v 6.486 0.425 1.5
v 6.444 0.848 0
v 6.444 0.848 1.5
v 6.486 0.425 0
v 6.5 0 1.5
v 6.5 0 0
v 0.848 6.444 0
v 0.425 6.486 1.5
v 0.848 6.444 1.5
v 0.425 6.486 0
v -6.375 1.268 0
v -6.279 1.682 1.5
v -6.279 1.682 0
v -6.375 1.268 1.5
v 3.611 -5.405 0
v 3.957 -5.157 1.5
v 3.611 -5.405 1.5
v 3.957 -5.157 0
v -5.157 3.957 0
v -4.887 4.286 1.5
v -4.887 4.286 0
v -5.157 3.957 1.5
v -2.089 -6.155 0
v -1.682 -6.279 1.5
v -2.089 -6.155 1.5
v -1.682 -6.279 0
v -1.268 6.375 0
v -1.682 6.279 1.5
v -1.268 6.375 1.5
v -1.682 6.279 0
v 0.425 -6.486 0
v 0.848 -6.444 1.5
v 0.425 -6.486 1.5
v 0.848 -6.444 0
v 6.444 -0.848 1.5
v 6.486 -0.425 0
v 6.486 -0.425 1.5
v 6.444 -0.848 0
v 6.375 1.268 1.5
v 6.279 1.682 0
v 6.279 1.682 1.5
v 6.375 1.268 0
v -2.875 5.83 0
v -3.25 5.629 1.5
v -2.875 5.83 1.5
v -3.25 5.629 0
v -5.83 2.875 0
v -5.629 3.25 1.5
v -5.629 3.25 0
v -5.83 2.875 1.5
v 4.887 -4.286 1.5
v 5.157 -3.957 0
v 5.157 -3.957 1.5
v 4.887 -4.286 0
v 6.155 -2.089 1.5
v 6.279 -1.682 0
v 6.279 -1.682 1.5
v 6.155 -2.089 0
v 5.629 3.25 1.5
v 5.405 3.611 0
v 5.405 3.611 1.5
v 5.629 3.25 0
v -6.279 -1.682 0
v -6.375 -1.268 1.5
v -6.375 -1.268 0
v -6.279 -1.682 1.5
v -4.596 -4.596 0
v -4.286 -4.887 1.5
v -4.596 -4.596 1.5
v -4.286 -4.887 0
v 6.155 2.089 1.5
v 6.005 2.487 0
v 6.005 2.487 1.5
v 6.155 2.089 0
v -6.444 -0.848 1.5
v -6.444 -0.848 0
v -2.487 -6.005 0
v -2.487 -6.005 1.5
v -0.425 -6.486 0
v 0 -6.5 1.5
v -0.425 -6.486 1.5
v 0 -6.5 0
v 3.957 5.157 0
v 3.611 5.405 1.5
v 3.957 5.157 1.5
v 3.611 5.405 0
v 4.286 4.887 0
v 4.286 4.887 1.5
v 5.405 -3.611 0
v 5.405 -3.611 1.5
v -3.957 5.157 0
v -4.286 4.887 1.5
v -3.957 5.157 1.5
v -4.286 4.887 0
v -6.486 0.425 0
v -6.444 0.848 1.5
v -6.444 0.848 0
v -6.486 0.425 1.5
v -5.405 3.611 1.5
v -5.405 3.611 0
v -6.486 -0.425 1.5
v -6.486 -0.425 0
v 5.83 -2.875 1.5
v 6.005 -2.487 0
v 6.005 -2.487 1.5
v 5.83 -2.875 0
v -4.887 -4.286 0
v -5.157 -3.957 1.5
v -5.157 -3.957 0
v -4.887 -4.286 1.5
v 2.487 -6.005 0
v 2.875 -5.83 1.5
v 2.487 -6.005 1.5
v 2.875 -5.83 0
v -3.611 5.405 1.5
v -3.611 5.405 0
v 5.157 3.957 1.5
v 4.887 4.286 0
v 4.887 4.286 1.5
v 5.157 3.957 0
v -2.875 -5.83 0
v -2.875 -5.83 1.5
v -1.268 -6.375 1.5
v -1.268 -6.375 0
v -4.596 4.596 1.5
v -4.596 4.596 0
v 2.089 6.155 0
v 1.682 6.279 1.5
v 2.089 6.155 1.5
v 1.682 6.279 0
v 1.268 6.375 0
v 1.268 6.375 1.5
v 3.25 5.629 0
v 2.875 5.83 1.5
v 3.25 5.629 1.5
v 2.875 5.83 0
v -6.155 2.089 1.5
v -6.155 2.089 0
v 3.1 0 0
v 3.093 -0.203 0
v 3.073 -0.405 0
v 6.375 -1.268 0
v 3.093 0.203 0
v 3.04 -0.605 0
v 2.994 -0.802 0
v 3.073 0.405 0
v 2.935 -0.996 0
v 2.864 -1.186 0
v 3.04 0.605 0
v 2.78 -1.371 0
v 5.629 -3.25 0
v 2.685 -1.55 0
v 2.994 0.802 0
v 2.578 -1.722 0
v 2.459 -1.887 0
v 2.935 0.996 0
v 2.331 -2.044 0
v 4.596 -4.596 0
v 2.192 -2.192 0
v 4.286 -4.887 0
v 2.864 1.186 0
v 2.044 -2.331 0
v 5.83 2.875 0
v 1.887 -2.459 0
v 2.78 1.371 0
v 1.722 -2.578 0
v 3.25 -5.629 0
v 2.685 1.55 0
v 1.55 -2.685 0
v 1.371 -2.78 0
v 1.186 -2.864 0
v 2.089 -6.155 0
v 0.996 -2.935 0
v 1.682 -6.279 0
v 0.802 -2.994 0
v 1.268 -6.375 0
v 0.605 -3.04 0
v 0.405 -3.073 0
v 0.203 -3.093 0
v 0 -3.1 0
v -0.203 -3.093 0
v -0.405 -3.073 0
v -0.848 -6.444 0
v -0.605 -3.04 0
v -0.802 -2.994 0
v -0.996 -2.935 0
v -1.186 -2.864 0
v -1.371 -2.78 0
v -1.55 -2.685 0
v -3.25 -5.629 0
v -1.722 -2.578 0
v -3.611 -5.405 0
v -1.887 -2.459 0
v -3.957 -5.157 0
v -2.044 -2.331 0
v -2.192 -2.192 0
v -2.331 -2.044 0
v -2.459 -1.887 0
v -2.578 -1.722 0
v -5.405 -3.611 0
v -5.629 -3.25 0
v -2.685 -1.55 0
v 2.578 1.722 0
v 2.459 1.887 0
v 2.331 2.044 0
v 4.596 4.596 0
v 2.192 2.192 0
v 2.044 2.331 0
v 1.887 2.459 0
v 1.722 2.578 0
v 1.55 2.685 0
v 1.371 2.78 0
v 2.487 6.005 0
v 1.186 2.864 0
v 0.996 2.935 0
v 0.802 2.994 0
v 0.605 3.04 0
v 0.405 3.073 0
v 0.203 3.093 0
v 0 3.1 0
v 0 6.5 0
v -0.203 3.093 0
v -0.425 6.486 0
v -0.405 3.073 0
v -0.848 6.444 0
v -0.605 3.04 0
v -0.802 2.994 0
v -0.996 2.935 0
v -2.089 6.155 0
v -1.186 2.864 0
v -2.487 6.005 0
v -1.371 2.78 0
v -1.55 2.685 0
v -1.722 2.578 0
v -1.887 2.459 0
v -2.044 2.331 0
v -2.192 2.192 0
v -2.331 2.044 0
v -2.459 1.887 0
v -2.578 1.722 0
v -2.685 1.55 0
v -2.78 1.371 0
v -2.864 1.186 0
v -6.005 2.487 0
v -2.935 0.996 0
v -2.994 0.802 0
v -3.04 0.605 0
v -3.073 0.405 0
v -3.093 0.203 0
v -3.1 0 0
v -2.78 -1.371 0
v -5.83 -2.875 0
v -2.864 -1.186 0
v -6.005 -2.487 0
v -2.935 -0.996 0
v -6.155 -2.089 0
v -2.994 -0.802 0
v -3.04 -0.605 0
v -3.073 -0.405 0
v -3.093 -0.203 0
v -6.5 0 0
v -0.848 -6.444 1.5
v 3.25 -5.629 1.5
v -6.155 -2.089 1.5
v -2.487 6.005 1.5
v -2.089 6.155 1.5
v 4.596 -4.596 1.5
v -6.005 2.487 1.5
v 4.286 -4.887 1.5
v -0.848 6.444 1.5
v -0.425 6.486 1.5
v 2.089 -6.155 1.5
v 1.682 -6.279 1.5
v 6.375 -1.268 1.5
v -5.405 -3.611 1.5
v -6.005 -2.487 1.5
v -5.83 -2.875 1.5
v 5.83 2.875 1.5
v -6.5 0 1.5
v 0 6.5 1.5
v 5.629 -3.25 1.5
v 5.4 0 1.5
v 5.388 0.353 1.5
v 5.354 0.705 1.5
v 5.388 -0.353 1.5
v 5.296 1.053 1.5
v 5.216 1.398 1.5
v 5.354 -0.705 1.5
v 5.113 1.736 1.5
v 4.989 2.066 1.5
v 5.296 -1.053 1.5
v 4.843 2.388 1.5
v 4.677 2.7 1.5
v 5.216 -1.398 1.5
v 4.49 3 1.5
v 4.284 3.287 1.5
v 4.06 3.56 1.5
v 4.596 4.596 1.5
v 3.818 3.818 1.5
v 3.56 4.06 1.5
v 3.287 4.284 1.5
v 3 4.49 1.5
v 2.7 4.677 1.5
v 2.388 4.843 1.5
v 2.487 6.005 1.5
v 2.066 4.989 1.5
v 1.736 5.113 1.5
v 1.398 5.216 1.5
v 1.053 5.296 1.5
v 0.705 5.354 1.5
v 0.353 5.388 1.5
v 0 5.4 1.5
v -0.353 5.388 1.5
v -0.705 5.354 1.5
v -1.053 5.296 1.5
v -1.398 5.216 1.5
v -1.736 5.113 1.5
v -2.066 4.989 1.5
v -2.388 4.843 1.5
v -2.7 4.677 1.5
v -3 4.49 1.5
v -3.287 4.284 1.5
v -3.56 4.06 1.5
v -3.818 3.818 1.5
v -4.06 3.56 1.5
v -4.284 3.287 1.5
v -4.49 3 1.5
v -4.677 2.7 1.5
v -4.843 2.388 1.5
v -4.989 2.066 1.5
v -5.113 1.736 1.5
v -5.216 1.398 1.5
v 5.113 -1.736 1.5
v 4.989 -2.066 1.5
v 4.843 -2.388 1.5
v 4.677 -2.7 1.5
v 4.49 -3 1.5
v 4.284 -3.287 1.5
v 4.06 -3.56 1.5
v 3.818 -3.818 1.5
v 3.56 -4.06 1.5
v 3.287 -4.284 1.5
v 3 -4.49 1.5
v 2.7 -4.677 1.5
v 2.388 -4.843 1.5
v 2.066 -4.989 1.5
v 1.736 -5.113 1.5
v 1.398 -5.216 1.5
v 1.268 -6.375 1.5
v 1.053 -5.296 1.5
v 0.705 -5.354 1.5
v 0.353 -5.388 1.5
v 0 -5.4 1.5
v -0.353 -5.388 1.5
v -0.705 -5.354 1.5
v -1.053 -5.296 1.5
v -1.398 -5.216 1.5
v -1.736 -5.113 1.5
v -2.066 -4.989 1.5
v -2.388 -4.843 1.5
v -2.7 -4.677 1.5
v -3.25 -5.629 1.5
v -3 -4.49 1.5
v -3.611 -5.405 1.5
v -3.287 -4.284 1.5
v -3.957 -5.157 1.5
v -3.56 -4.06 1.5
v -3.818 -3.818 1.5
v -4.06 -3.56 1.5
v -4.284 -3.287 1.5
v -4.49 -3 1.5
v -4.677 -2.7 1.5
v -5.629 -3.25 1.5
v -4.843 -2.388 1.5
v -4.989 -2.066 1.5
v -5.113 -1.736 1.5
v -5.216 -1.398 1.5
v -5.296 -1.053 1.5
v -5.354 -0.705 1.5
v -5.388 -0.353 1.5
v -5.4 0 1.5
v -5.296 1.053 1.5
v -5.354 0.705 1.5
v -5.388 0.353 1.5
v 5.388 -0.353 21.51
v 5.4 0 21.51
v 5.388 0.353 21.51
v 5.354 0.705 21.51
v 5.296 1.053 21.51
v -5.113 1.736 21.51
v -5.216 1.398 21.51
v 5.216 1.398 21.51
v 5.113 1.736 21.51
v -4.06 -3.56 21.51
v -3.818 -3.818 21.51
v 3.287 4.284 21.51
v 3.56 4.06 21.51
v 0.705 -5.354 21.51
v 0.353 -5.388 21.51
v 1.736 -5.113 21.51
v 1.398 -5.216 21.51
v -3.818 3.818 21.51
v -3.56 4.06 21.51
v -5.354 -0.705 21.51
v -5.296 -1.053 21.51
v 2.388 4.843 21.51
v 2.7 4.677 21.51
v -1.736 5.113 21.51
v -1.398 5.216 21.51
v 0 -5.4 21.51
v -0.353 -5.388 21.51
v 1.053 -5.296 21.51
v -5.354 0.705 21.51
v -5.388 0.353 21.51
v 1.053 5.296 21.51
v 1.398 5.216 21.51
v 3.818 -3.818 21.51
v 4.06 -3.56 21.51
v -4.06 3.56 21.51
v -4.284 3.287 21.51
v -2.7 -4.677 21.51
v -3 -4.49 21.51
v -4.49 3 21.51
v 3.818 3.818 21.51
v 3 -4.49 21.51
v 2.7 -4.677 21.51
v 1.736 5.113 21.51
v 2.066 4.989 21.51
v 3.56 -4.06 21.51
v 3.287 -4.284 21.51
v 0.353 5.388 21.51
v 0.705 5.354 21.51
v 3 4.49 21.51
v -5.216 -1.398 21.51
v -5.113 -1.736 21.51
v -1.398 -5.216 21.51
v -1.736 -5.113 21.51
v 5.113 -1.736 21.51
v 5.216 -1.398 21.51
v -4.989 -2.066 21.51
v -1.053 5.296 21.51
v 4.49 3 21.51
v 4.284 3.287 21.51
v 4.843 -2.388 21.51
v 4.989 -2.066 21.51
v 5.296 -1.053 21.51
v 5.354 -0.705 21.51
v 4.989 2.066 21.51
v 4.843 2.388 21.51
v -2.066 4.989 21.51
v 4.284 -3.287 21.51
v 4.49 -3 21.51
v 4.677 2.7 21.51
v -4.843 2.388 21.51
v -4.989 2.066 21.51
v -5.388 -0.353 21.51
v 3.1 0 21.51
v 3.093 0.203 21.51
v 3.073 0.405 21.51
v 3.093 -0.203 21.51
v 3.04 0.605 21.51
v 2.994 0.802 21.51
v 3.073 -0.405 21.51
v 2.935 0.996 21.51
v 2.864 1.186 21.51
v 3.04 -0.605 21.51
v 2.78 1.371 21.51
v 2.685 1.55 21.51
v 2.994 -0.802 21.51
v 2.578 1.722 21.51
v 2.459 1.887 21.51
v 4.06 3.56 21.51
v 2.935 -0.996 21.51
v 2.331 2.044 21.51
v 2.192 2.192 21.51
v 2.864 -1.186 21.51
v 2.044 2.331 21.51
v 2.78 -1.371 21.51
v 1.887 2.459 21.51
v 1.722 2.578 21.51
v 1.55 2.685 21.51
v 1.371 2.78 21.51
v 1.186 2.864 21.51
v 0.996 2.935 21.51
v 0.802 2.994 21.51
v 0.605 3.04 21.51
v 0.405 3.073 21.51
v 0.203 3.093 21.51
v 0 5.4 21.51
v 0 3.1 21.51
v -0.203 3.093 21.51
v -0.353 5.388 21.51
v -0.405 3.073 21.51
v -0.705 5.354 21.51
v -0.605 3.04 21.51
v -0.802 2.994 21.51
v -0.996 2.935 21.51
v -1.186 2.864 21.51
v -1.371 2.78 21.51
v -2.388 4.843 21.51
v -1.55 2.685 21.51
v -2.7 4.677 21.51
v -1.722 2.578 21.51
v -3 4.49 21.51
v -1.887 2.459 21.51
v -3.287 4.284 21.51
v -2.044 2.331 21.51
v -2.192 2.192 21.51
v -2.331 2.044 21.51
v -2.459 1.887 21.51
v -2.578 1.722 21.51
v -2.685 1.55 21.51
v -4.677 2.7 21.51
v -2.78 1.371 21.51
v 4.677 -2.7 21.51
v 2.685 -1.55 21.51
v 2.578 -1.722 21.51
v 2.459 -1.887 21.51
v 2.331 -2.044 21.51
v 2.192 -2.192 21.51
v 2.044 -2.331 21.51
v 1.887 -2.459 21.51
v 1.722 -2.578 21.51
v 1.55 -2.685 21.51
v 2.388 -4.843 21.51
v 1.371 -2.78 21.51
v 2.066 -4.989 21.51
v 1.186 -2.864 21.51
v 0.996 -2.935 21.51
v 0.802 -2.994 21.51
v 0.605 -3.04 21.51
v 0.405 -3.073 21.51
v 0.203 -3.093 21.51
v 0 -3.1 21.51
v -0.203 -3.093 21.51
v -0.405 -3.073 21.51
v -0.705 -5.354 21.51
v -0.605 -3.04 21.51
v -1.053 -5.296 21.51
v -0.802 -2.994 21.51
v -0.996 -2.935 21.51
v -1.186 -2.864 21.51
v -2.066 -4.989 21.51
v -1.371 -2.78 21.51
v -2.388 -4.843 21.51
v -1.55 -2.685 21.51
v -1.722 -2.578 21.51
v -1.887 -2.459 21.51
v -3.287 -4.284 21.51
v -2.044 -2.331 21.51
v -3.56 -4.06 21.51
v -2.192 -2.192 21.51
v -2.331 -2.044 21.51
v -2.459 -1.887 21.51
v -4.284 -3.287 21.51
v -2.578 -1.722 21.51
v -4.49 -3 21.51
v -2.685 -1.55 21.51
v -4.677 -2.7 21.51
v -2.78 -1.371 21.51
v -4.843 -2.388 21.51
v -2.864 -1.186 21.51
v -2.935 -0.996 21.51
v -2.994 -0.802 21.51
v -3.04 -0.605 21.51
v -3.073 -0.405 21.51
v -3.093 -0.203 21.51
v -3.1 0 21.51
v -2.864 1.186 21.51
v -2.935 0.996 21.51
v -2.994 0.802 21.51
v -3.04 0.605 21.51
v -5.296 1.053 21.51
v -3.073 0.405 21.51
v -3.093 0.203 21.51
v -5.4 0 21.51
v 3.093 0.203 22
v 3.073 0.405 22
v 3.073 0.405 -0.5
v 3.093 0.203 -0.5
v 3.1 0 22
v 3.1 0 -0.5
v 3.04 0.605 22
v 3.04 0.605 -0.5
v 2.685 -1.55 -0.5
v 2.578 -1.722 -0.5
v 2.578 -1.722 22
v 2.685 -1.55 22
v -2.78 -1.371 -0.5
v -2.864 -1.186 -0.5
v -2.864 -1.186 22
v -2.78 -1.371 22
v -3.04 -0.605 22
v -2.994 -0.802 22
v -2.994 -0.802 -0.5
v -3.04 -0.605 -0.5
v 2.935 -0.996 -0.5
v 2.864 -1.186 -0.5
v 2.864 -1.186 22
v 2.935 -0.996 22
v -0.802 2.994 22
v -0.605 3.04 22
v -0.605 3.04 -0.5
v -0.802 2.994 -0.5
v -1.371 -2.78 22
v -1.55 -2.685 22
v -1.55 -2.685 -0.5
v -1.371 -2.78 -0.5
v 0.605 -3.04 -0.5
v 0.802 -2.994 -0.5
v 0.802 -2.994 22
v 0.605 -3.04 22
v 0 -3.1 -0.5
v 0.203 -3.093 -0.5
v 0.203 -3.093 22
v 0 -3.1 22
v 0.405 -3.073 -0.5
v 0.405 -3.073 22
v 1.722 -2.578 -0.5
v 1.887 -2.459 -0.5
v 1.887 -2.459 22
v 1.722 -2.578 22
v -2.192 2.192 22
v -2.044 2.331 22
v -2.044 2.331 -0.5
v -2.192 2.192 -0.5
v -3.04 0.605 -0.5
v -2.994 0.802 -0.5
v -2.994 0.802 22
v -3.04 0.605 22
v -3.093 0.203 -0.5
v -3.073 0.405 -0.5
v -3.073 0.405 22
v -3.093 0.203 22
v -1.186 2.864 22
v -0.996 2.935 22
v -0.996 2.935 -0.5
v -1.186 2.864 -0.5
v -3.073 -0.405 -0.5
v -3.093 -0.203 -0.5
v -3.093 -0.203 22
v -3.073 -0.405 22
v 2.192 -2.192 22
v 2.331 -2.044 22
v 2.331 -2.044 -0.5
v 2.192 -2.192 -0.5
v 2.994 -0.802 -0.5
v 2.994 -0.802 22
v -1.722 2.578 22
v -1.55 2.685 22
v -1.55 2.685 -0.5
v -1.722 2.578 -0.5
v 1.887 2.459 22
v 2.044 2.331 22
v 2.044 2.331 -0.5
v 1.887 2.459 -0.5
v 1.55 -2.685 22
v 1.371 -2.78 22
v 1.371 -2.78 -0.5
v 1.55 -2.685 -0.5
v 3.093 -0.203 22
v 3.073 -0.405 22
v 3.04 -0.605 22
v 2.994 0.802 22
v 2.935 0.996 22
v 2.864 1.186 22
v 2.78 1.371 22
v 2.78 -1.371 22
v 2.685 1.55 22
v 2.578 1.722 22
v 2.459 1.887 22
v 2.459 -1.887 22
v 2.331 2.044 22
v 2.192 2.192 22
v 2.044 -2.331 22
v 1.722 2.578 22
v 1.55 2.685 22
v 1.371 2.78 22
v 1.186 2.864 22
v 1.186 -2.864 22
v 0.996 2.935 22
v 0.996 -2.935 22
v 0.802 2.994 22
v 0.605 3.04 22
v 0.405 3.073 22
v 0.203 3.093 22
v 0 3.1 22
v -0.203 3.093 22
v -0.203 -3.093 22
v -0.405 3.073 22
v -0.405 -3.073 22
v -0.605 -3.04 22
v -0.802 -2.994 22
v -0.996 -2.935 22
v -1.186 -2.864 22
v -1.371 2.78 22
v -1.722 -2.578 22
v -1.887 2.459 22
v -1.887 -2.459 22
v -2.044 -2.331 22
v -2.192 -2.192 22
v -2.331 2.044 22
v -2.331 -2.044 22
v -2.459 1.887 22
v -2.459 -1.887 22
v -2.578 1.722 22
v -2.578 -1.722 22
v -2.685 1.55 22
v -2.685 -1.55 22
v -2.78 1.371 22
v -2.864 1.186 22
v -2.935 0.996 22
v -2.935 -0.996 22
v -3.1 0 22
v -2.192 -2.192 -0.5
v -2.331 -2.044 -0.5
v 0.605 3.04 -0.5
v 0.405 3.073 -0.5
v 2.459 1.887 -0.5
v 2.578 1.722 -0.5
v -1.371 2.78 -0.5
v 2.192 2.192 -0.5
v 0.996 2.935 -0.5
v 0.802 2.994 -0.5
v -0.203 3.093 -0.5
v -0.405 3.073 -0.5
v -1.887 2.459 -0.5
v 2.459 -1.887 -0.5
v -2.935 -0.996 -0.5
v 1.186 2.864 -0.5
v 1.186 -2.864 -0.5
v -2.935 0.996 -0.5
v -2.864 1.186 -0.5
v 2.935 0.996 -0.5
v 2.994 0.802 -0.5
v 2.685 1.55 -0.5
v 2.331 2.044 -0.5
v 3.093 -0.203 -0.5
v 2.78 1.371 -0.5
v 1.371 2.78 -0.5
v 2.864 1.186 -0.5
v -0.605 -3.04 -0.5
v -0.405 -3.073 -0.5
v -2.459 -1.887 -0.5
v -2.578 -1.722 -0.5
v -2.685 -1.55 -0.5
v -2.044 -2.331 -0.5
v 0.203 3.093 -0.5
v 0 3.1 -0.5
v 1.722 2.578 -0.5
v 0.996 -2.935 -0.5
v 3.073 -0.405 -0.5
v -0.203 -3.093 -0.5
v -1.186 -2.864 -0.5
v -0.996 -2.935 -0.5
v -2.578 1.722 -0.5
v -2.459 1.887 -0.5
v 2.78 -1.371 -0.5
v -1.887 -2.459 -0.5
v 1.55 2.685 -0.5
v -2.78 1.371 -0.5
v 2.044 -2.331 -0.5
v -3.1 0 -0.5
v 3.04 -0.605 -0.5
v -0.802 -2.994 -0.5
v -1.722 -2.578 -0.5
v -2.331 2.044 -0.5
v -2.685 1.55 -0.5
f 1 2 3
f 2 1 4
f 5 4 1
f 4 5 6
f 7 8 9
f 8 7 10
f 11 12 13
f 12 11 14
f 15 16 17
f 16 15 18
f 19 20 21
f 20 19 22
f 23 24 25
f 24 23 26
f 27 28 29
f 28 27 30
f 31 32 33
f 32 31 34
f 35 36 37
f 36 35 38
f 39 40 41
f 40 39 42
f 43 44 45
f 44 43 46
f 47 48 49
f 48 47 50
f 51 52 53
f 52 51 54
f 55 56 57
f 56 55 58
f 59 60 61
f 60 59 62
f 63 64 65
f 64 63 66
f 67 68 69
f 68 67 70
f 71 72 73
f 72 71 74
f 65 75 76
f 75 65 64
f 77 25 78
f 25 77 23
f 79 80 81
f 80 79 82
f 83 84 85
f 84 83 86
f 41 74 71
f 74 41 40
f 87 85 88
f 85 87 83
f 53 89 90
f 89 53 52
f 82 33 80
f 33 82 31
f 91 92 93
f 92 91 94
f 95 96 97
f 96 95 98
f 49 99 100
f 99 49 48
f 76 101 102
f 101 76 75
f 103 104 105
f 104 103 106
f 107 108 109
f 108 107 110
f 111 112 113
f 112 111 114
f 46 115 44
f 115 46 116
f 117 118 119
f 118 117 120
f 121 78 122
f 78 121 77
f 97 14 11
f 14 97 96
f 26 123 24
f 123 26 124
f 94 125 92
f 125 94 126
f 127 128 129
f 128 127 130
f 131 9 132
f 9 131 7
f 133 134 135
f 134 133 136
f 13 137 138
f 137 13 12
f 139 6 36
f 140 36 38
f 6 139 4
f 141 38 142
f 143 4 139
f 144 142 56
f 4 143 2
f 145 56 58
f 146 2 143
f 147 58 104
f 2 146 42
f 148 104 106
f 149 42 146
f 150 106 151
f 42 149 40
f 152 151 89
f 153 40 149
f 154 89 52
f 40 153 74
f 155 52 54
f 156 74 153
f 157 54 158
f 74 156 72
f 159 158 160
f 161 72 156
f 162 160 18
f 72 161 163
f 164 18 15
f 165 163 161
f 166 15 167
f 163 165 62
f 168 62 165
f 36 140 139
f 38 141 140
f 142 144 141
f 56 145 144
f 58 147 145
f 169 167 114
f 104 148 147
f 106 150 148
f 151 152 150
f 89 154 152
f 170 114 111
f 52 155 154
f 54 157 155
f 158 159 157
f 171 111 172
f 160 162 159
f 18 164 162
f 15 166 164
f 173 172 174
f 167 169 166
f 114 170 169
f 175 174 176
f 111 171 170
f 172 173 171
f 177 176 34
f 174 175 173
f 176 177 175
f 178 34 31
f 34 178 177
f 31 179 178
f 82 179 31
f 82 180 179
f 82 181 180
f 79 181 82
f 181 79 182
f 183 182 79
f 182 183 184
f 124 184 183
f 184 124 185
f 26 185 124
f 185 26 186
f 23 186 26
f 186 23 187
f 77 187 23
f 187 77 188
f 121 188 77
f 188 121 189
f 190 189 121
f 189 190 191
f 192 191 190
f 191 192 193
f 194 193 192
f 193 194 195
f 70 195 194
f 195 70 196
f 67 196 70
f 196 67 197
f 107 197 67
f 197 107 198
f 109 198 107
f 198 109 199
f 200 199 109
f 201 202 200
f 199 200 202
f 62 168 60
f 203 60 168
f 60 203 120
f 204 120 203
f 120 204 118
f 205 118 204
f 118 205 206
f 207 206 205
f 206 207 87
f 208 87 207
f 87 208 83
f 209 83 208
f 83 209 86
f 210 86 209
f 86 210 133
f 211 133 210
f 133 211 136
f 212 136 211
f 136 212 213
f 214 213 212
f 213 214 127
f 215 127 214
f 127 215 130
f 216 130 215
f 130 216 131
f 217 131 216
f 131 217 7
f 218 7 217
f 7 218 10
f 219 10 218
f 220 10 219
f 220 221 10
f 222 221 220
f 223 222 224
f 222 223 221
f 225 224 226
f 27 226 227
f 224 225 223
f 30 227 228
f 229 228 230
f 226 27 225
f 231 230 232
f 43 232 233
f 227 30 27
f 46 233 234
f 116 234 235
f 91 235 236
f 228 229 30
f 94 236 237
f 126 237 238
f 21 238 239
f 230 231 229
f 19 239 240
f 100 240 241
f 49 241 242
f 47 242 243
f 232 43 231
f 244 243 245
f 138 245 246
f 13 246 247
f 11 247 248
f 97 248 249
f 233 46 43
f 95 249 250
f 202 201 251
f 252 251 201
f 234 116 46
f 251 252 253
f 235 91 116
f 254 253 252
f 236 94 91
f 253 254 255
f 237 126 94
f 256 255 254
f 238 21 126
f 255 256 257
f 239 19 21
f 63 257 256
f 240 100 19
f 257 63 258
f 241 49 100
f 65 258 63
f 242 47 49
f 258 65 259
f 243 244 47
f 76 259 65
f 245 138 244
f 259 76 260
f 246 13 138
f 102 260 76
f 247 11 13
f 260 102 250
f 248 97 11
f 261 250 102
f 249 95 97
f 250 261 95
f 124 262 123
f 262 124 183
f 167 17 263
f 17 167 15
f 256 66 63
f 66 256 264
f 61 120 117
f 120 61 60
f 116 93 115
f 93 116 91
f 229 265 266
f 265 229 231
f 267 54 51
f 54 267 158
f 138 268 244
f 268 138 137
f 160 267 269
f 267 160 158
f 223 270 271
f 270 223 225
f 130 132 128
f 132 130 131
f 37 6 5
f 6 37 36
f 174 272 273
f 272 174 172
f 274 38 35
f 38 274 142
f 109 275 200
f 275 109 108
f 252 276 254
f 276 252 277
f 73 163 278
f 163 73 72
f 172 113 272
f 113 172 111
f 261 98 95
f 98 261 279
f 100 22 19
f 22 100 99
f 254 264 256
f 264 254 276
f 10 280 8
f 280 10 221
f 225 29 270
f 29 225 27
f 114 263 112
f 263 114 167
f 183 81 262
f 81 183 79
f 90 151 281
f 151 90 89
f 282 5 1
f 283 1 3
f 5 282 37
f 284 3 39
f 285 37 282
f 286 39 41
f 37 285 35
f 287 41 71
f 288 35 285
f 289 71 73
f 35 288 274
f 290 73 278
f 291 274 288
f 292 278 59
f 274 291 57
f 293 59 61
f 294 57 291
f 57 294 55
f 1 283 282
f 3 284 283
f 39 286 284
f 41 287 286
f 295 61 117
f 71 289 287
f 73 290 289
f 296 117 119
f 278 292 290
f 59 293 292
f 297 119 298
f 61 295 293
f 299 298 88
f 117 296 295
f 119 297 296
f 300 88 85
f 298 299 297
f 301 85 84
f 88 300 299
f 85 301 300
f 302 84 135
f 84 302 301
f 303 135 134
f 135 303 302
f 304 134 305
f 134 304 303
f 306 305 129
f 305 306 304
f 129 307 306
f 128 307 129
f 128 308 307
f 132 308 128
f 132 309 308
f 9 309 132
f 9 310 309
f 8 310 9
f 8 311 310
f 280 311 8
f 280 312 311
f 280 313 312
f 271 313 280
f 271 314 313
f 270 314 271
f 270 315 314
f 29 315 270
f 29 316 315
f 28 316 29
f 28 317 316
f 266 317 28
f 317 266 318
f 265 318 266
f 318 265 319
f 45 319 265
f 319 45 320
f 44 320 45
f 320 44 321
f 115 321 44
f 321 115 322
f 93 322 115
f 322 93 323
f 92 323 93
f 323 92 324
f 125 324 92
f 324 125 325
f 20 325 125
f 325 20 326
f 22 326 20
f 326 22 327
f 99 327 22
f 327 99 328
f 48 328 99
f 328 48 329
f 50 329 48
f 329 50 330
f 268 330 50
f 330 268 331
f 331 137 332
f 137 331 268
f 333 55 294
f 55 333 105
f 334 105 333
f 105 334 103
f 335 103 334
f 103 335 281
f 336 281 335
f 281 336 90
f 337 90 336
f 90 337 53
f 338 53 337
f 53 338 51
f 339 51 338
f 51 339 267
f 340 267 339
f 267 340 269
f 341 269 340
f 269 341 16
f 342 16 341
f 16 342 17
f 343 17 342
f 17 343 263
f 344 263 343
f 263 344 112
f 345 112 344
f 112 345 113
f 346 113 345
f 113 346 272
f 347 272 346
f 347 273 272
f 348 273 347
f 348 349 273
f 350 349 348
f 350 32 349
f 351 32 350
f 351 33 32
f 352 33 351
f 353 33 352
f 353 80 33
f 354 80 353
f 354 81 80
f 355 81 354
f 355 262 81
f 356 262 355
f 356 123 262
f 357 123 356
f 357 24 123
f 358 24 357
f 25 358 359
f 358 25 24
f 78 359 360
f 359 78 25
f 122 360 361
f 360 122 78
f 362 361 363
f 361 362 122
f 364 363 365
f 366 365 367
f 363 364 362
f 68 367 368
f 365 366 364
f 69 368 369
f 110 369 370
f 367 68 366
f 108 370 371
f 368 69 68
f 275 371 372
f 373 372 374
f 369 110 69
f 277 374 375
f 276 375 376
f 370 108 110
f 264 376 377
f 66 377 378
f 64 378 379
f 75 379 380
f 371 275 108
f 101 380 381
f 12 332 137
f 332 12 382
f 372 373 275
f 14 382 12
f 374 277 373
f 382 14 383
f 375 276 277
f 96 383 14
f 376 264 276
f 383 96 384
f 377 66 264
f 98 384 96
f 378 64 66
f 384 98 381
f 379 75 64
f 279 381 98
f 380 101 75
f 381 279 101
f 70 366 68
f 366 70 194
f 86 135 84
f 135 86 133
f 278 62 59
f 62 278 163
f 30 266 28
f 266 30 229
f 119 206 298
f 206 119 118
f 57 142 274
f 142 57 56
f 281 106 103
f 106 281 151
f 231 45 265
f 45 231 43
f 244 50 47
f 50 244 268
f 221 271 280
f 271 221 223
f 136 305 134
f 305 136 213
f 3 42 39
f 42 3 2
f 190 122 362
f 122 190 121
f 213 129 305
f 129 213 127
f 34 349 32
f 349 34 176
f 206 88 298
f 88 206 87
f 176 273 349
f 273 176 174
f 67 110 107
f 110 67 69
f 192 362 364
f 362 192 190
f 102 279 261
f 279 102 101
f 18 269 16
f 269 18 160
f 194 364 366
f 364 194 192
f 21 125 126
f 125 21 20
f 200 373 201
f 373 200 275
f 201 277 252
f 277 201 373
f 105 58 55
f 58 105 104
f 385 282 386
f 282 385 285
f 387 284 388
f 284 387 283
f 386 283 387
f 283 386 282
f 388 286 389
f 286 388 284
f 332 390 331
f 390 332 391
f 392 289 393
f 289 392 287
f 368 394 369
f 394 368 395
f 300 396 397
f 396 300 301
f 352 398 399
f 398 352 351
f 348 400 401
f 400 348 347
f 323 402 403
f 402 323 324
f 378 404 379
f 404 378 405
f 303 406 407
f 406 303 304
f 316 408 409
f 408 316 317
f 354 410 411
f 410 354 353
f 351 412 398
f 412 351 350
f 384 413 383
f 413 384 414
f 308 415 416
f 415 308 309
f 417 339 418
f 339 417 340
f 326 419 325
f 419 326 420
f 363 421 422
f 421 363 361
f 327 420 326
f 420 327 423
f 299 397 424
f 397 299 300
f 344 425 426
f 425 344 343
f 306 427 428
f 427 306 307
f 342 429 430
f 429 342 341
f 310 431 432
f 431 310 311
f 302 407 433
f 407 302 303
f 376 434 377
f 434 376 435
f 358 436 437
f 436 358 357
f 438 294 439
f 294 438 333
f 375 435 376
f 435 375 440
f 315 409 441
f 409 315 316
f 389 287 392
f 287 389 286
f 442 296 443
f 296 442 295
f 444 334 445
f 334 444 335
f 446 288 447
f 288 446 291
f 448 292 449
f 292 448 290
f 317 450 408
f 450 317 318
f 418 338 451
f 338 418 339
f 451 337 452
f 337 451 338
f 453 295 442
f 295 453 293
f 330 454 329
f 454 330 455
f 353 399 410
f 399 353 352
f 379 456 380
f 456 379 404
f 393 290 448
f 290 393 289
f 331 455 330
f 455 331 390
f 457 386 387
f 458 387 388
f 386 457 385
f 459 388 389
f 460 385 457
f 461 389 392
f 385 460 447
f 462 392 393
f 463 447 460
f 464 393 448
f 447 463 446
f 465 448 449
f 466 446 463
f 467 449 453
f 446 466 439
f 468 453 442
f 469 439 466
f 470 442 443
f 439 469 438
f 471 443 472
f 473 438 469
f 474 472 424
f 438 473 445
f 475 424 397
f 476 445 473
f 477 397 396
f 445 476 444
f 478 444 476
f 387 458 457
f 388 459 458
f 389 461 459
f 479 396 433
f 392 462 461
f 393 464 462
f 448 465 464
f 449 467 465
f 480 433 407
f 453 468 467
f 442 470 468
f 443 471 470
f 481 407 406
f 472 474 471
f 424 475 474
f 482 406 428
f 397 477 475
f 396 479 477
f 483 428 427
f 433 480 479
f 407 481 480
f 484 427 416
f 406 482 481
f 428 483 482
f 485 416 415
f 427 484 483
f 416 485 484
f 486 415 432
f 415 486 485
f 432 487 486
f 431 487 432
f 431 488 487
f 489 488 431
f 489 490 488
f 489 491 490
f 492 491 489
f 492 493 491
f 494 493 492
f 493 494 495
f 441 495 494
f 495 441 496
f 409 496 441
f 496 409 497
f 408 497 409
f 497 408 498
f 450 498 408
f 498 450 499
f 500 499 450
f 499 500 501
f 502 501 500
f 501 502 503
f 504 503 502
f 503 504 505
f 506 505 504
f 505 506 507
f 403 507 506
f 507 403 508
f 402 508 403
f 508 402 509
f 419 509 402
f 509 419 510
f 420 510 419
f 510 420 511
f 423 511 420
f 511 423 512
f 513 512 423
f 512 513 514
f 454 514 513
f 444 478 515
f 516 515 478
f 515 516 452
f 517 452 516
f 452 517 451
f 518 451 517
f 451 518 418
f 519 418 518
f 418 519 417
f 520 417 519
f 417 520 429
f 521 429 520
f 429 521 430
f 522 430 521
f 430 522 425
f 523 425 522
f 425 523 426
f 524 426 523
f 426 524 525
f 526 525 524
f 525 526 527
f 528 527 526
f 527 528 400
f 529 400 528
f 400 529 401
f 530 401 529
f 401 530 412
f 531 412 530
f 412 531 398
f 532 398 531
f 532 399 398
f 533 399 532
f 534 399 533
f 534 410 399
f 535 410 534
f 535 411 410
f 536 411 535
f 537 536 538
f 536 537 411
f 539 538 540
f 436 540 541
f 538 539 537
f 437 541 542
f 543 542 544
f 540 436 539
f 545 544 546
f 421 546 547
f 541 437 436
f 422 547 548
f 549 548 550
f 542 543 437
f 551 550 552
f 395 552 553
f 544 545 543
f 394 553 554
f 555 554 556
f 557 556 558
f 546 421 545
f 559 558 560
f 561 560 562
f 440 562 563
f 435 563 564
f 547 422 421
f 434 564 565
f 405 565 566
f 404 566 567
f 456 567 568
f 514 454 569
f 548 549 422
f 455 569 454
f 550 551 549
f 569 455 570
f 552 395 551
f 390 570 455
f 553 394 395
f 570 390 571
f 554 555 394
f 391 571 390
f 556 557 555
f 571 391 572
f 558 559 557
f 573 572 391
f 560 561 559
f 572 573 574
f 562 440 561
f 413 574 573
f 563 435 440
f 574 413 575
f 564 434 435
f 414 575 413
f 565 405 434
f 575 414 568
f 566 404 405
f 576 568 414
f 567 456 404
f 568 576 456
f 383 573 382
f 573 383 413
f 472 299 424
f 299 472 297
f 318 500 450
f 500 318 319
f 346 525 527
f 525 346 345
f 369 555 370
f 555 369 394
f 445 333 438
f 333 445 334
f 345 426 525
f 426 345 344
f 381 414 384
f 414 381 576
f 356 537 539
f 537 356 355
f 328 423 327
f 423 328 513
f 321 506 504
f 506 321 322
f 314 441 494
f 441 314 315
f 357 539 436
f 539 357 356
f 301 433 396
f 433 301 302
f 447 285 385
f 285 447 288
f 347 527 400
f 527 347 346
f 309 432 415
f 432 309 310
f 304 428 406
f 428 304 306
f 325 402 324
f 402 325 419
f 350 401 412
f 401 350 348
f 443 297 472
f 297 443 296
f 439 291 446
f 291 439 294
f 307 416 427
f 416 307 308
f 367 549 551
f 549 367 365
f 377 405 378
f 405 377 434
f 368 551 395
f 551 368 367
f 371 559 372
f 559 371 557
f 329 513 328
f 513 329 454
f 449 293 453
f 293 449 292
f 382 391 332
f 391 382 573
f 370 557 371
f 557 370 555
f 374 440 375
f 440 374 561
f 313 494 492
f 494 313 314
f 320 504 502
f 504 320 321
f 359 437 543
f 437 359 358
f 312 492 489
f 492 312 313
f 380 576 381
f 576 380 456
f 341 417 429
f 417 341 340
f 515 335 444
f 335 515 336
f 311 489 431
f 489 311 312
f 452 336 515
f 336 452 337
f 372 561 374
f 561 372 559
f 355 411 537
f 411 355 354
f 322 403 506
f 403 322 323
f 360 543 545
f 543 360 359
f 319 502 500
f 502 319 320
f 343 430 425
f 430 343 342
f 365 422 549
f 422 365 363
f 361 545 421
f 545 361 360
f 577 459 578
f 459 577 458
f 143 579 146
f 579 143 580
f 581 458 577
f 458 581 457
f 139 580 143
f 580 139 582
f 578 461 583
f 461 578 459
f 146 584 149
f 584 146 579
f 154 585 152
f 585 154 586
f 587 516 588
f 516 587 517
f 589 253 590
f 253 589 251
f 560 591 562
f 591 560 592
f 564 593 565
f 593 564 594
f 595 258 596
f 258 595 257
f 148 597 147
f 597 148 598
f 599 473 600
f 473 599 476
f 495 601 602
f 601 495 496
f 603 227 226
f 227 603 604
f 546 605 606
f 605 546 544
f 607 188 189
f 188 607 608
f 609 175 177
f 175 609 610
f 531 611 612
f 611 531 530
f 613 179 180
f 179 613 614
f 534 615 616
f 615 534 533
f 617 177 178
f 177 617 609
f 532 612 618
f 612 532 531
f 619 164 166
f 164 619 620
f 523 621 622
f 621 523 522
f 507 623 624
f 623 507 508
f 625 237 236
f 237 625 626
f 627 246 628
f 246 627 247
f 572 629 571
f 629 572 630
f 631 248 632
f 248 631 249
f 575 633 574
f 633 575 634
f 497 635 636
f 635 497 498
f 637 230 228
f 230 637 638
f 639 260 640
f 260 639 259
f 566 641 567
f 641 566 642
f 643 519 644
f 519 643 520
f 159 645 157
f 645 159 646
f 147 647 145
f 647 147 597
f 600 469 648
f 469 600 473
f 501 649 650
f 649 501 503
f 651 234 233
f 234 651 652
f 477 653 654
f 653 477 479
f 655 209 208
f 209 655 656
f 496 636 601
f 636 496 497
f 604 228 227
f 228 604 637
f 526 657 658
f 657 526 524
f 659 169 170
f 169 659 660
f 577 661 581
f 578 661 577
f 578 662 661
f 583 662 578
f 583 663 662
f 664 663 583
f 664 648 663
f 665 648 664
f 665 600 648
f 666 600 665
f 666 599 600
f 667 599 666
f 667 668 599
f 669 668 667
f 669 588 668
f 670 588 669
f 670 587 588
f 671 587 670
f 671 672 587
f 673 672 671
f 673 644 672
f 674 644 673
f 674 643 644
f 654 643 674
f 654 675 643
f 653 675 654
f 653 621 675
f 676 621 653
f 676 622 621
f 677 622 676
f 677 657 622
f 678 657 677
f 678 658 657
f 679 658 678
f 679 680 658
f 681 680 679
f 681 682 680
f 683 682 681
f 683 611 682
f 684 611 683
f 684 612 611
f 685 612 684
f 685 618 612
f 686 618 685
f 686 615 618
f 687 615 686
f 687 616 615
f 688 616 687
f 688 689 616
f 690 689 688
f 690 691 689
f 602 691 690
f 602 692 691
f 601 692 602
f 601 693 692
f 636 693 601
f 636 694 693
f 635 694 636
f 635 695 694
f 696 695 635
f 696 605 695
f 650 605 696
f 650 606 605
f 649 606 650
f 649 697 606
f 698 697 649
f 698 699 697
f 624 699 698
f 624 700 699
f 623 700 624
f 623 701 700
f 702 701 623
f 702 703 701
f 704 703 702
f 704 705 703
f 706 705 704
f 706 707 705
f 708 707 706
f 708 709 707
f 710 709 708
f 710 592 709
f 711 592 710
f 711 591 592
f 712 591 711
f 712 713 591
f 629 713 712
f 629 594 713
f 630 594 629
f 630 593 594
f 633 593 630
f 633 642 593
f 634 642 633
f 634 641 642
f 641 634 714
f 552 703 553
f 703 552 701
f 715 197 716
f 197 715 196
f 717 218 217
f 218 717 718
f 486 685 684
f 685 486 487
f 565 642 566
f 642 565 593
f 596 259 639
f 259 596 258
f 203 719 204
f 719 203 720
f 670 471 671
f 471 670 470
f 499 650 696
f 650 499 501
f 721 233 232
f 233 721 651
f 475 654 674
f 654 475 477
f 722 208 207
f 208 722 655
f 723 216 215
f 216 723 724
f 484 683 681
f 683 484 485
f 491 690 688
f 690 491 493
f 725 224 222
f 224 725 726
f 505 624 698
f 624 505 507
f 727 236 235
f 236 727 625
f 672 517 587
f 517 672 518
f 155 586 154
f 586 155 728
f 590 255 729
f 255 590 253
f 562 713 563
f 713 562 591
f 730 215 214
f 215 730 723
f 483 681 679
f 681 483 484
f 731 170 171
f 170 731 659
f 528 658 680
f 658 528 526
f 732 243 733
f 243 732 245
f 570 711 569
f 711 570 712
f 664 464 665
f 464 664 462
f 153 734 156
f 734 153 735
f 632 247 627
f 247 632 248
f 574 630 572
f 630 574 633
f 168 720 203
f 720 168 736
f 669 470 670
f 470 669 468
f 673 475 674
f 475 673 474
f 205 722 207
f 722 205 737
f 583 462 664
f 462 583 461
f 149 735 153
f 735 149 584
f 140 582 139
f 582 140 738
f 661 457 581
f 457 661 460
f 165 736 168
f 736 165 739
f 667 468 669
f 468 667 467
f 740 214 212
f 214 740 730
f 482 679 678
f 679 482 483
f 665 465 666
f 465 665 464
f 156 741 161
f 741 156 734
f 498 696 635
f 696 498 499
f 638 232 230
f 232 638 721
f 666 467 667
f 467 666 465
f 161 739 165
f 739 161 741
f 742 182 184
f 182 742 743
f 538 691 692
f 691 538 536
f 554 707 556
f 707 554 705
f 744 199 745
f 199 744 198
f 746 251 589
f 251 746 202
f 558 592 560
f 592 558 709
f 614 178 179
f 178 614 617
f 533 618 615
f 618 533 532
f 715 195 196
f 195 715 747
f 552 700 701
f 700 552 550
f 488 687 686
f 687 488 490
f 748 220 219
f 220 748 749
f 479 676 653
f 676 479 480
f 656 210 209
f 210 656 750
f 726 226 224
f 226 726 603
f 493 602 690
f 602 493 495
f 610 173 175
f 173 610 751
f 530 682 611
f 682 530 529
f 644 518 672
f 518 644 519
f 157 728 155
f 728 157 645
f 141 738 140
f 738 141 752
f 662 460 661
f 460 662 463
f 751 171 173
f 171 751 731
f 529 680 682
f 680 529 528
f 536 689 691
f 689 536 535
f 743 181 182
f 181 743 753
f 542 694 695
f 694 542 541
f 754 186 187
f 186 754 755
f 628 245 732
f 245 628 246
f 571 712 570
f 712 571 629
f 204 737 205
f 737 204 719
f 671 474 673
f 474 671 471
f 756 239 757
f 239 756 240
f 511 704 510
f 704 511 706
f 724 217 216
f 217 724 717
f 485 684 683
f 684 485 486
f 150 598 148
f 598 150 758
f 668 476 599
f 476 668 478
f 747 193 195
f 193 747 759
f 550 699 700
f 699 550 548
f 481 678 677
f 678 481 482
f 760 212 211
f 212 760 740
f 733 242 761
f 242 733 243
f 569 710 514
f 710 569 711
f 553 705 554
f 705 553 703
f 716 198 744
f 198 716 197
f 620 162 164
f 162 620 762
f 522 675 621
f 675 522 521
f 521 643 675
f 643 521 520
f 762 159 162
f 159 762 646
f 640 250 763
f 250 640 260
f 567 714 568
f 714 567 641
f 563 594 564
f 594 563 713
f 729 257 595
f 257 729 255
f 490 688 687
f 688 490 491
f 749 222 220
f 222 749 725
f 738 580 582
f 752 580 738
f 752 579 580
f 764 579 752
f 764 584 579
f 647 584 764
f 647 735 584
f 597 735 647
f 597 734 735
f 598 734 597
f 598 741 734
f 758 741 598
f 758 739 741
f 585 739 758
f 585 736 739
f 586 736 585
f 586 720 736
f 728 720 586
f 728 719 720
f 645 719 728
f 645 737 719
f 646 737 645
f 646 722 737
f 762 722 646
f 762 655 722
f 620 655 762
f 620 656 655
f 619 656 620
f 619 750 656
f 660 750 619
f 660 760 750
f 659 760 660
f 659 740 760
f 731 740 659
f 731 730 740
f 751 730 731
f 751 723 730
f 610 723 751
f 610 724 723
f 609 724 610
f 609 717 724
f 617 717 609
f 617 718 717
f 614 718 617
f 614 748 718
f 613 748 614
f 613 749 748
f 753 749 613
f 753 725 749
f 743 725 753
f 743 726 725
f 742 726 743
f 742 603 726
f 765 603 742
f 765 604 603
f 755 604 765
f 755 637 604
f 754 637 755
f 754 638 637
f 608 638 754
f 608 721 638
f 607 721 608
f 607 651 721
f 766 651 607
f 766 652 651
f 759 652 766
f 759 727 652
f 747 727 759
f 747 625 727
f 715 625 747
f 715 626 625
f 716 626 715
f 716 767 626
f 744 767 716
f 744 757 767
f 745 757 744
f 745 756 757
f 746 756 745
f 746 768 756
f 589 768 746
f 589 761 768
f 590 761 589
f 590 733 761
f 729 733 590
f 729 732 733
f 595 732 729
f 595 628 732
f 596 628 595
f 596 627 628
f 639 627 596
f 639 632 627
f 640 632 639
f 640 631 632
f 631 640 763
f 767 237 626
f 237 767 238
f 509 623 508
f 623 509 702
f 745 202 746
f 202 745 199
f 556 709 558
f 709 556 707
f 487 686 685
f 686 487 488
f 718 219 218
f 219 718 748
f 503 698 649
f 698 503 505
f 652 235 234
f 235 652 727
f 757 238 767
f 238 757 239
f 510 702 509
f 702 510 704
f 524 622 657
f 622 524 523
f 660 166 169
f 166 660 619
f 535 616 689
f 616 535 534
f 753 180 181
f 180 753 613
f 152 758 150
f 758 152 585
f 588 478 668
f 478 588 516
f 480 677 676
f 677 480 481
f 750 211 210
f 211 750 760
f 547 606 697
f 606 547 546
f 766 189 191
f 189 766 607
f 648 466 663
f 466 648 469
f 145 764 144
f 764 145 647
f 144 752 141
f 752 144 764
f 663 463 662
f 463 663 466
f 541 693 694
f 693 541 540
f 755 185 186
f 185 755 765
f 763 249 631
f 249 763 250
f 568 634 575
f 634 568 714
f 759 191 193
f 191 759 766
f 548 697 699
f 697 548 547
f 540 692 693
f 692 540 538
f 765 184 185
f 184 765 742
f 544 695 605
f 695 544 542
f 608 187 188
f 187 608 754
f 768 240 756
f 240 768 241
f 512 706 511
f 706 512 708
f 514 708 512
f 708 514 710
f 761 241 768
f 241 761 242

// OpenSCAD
// PCR tube adapter sleeve: fits a 0.2 mL tube into a 1.5 mL tube rack hole
// Print orientation: collar on bed (z = 0), sleeve body builds upward

// ---- Dimensions (mm) ----
collar_d        = 13;     // collar outer diameter
collar_t        = 1.5;    // collar thickness (z = 0 to 1.5)
sleeve_d        = 10.8;   // sleeve body outer diameter
sleeve_h        = 20;     // sleeve body height (z = 1.5 to 21.5)
bore_d          = 6.2;    // through-bore diameter
eps             = 0.5;    // cutter overshoot past faces

$fn = 96;

// ---- Model ----
union() {
    // Collar
    cylinder(d = collar_d, h = collar_t);
    // Sleeve body (slightly overlapping the collar for a clean union)
    translate([0, 0, collar_t - 0.01])
        cylinder(d = sleeve_d, h = sleeve_h + 0.02);
    // Through bore
    translate([0, 0, -eps])
        cylinder(d = bore_d, h = sleeve_h + collar_t + 2 * eps);
}
